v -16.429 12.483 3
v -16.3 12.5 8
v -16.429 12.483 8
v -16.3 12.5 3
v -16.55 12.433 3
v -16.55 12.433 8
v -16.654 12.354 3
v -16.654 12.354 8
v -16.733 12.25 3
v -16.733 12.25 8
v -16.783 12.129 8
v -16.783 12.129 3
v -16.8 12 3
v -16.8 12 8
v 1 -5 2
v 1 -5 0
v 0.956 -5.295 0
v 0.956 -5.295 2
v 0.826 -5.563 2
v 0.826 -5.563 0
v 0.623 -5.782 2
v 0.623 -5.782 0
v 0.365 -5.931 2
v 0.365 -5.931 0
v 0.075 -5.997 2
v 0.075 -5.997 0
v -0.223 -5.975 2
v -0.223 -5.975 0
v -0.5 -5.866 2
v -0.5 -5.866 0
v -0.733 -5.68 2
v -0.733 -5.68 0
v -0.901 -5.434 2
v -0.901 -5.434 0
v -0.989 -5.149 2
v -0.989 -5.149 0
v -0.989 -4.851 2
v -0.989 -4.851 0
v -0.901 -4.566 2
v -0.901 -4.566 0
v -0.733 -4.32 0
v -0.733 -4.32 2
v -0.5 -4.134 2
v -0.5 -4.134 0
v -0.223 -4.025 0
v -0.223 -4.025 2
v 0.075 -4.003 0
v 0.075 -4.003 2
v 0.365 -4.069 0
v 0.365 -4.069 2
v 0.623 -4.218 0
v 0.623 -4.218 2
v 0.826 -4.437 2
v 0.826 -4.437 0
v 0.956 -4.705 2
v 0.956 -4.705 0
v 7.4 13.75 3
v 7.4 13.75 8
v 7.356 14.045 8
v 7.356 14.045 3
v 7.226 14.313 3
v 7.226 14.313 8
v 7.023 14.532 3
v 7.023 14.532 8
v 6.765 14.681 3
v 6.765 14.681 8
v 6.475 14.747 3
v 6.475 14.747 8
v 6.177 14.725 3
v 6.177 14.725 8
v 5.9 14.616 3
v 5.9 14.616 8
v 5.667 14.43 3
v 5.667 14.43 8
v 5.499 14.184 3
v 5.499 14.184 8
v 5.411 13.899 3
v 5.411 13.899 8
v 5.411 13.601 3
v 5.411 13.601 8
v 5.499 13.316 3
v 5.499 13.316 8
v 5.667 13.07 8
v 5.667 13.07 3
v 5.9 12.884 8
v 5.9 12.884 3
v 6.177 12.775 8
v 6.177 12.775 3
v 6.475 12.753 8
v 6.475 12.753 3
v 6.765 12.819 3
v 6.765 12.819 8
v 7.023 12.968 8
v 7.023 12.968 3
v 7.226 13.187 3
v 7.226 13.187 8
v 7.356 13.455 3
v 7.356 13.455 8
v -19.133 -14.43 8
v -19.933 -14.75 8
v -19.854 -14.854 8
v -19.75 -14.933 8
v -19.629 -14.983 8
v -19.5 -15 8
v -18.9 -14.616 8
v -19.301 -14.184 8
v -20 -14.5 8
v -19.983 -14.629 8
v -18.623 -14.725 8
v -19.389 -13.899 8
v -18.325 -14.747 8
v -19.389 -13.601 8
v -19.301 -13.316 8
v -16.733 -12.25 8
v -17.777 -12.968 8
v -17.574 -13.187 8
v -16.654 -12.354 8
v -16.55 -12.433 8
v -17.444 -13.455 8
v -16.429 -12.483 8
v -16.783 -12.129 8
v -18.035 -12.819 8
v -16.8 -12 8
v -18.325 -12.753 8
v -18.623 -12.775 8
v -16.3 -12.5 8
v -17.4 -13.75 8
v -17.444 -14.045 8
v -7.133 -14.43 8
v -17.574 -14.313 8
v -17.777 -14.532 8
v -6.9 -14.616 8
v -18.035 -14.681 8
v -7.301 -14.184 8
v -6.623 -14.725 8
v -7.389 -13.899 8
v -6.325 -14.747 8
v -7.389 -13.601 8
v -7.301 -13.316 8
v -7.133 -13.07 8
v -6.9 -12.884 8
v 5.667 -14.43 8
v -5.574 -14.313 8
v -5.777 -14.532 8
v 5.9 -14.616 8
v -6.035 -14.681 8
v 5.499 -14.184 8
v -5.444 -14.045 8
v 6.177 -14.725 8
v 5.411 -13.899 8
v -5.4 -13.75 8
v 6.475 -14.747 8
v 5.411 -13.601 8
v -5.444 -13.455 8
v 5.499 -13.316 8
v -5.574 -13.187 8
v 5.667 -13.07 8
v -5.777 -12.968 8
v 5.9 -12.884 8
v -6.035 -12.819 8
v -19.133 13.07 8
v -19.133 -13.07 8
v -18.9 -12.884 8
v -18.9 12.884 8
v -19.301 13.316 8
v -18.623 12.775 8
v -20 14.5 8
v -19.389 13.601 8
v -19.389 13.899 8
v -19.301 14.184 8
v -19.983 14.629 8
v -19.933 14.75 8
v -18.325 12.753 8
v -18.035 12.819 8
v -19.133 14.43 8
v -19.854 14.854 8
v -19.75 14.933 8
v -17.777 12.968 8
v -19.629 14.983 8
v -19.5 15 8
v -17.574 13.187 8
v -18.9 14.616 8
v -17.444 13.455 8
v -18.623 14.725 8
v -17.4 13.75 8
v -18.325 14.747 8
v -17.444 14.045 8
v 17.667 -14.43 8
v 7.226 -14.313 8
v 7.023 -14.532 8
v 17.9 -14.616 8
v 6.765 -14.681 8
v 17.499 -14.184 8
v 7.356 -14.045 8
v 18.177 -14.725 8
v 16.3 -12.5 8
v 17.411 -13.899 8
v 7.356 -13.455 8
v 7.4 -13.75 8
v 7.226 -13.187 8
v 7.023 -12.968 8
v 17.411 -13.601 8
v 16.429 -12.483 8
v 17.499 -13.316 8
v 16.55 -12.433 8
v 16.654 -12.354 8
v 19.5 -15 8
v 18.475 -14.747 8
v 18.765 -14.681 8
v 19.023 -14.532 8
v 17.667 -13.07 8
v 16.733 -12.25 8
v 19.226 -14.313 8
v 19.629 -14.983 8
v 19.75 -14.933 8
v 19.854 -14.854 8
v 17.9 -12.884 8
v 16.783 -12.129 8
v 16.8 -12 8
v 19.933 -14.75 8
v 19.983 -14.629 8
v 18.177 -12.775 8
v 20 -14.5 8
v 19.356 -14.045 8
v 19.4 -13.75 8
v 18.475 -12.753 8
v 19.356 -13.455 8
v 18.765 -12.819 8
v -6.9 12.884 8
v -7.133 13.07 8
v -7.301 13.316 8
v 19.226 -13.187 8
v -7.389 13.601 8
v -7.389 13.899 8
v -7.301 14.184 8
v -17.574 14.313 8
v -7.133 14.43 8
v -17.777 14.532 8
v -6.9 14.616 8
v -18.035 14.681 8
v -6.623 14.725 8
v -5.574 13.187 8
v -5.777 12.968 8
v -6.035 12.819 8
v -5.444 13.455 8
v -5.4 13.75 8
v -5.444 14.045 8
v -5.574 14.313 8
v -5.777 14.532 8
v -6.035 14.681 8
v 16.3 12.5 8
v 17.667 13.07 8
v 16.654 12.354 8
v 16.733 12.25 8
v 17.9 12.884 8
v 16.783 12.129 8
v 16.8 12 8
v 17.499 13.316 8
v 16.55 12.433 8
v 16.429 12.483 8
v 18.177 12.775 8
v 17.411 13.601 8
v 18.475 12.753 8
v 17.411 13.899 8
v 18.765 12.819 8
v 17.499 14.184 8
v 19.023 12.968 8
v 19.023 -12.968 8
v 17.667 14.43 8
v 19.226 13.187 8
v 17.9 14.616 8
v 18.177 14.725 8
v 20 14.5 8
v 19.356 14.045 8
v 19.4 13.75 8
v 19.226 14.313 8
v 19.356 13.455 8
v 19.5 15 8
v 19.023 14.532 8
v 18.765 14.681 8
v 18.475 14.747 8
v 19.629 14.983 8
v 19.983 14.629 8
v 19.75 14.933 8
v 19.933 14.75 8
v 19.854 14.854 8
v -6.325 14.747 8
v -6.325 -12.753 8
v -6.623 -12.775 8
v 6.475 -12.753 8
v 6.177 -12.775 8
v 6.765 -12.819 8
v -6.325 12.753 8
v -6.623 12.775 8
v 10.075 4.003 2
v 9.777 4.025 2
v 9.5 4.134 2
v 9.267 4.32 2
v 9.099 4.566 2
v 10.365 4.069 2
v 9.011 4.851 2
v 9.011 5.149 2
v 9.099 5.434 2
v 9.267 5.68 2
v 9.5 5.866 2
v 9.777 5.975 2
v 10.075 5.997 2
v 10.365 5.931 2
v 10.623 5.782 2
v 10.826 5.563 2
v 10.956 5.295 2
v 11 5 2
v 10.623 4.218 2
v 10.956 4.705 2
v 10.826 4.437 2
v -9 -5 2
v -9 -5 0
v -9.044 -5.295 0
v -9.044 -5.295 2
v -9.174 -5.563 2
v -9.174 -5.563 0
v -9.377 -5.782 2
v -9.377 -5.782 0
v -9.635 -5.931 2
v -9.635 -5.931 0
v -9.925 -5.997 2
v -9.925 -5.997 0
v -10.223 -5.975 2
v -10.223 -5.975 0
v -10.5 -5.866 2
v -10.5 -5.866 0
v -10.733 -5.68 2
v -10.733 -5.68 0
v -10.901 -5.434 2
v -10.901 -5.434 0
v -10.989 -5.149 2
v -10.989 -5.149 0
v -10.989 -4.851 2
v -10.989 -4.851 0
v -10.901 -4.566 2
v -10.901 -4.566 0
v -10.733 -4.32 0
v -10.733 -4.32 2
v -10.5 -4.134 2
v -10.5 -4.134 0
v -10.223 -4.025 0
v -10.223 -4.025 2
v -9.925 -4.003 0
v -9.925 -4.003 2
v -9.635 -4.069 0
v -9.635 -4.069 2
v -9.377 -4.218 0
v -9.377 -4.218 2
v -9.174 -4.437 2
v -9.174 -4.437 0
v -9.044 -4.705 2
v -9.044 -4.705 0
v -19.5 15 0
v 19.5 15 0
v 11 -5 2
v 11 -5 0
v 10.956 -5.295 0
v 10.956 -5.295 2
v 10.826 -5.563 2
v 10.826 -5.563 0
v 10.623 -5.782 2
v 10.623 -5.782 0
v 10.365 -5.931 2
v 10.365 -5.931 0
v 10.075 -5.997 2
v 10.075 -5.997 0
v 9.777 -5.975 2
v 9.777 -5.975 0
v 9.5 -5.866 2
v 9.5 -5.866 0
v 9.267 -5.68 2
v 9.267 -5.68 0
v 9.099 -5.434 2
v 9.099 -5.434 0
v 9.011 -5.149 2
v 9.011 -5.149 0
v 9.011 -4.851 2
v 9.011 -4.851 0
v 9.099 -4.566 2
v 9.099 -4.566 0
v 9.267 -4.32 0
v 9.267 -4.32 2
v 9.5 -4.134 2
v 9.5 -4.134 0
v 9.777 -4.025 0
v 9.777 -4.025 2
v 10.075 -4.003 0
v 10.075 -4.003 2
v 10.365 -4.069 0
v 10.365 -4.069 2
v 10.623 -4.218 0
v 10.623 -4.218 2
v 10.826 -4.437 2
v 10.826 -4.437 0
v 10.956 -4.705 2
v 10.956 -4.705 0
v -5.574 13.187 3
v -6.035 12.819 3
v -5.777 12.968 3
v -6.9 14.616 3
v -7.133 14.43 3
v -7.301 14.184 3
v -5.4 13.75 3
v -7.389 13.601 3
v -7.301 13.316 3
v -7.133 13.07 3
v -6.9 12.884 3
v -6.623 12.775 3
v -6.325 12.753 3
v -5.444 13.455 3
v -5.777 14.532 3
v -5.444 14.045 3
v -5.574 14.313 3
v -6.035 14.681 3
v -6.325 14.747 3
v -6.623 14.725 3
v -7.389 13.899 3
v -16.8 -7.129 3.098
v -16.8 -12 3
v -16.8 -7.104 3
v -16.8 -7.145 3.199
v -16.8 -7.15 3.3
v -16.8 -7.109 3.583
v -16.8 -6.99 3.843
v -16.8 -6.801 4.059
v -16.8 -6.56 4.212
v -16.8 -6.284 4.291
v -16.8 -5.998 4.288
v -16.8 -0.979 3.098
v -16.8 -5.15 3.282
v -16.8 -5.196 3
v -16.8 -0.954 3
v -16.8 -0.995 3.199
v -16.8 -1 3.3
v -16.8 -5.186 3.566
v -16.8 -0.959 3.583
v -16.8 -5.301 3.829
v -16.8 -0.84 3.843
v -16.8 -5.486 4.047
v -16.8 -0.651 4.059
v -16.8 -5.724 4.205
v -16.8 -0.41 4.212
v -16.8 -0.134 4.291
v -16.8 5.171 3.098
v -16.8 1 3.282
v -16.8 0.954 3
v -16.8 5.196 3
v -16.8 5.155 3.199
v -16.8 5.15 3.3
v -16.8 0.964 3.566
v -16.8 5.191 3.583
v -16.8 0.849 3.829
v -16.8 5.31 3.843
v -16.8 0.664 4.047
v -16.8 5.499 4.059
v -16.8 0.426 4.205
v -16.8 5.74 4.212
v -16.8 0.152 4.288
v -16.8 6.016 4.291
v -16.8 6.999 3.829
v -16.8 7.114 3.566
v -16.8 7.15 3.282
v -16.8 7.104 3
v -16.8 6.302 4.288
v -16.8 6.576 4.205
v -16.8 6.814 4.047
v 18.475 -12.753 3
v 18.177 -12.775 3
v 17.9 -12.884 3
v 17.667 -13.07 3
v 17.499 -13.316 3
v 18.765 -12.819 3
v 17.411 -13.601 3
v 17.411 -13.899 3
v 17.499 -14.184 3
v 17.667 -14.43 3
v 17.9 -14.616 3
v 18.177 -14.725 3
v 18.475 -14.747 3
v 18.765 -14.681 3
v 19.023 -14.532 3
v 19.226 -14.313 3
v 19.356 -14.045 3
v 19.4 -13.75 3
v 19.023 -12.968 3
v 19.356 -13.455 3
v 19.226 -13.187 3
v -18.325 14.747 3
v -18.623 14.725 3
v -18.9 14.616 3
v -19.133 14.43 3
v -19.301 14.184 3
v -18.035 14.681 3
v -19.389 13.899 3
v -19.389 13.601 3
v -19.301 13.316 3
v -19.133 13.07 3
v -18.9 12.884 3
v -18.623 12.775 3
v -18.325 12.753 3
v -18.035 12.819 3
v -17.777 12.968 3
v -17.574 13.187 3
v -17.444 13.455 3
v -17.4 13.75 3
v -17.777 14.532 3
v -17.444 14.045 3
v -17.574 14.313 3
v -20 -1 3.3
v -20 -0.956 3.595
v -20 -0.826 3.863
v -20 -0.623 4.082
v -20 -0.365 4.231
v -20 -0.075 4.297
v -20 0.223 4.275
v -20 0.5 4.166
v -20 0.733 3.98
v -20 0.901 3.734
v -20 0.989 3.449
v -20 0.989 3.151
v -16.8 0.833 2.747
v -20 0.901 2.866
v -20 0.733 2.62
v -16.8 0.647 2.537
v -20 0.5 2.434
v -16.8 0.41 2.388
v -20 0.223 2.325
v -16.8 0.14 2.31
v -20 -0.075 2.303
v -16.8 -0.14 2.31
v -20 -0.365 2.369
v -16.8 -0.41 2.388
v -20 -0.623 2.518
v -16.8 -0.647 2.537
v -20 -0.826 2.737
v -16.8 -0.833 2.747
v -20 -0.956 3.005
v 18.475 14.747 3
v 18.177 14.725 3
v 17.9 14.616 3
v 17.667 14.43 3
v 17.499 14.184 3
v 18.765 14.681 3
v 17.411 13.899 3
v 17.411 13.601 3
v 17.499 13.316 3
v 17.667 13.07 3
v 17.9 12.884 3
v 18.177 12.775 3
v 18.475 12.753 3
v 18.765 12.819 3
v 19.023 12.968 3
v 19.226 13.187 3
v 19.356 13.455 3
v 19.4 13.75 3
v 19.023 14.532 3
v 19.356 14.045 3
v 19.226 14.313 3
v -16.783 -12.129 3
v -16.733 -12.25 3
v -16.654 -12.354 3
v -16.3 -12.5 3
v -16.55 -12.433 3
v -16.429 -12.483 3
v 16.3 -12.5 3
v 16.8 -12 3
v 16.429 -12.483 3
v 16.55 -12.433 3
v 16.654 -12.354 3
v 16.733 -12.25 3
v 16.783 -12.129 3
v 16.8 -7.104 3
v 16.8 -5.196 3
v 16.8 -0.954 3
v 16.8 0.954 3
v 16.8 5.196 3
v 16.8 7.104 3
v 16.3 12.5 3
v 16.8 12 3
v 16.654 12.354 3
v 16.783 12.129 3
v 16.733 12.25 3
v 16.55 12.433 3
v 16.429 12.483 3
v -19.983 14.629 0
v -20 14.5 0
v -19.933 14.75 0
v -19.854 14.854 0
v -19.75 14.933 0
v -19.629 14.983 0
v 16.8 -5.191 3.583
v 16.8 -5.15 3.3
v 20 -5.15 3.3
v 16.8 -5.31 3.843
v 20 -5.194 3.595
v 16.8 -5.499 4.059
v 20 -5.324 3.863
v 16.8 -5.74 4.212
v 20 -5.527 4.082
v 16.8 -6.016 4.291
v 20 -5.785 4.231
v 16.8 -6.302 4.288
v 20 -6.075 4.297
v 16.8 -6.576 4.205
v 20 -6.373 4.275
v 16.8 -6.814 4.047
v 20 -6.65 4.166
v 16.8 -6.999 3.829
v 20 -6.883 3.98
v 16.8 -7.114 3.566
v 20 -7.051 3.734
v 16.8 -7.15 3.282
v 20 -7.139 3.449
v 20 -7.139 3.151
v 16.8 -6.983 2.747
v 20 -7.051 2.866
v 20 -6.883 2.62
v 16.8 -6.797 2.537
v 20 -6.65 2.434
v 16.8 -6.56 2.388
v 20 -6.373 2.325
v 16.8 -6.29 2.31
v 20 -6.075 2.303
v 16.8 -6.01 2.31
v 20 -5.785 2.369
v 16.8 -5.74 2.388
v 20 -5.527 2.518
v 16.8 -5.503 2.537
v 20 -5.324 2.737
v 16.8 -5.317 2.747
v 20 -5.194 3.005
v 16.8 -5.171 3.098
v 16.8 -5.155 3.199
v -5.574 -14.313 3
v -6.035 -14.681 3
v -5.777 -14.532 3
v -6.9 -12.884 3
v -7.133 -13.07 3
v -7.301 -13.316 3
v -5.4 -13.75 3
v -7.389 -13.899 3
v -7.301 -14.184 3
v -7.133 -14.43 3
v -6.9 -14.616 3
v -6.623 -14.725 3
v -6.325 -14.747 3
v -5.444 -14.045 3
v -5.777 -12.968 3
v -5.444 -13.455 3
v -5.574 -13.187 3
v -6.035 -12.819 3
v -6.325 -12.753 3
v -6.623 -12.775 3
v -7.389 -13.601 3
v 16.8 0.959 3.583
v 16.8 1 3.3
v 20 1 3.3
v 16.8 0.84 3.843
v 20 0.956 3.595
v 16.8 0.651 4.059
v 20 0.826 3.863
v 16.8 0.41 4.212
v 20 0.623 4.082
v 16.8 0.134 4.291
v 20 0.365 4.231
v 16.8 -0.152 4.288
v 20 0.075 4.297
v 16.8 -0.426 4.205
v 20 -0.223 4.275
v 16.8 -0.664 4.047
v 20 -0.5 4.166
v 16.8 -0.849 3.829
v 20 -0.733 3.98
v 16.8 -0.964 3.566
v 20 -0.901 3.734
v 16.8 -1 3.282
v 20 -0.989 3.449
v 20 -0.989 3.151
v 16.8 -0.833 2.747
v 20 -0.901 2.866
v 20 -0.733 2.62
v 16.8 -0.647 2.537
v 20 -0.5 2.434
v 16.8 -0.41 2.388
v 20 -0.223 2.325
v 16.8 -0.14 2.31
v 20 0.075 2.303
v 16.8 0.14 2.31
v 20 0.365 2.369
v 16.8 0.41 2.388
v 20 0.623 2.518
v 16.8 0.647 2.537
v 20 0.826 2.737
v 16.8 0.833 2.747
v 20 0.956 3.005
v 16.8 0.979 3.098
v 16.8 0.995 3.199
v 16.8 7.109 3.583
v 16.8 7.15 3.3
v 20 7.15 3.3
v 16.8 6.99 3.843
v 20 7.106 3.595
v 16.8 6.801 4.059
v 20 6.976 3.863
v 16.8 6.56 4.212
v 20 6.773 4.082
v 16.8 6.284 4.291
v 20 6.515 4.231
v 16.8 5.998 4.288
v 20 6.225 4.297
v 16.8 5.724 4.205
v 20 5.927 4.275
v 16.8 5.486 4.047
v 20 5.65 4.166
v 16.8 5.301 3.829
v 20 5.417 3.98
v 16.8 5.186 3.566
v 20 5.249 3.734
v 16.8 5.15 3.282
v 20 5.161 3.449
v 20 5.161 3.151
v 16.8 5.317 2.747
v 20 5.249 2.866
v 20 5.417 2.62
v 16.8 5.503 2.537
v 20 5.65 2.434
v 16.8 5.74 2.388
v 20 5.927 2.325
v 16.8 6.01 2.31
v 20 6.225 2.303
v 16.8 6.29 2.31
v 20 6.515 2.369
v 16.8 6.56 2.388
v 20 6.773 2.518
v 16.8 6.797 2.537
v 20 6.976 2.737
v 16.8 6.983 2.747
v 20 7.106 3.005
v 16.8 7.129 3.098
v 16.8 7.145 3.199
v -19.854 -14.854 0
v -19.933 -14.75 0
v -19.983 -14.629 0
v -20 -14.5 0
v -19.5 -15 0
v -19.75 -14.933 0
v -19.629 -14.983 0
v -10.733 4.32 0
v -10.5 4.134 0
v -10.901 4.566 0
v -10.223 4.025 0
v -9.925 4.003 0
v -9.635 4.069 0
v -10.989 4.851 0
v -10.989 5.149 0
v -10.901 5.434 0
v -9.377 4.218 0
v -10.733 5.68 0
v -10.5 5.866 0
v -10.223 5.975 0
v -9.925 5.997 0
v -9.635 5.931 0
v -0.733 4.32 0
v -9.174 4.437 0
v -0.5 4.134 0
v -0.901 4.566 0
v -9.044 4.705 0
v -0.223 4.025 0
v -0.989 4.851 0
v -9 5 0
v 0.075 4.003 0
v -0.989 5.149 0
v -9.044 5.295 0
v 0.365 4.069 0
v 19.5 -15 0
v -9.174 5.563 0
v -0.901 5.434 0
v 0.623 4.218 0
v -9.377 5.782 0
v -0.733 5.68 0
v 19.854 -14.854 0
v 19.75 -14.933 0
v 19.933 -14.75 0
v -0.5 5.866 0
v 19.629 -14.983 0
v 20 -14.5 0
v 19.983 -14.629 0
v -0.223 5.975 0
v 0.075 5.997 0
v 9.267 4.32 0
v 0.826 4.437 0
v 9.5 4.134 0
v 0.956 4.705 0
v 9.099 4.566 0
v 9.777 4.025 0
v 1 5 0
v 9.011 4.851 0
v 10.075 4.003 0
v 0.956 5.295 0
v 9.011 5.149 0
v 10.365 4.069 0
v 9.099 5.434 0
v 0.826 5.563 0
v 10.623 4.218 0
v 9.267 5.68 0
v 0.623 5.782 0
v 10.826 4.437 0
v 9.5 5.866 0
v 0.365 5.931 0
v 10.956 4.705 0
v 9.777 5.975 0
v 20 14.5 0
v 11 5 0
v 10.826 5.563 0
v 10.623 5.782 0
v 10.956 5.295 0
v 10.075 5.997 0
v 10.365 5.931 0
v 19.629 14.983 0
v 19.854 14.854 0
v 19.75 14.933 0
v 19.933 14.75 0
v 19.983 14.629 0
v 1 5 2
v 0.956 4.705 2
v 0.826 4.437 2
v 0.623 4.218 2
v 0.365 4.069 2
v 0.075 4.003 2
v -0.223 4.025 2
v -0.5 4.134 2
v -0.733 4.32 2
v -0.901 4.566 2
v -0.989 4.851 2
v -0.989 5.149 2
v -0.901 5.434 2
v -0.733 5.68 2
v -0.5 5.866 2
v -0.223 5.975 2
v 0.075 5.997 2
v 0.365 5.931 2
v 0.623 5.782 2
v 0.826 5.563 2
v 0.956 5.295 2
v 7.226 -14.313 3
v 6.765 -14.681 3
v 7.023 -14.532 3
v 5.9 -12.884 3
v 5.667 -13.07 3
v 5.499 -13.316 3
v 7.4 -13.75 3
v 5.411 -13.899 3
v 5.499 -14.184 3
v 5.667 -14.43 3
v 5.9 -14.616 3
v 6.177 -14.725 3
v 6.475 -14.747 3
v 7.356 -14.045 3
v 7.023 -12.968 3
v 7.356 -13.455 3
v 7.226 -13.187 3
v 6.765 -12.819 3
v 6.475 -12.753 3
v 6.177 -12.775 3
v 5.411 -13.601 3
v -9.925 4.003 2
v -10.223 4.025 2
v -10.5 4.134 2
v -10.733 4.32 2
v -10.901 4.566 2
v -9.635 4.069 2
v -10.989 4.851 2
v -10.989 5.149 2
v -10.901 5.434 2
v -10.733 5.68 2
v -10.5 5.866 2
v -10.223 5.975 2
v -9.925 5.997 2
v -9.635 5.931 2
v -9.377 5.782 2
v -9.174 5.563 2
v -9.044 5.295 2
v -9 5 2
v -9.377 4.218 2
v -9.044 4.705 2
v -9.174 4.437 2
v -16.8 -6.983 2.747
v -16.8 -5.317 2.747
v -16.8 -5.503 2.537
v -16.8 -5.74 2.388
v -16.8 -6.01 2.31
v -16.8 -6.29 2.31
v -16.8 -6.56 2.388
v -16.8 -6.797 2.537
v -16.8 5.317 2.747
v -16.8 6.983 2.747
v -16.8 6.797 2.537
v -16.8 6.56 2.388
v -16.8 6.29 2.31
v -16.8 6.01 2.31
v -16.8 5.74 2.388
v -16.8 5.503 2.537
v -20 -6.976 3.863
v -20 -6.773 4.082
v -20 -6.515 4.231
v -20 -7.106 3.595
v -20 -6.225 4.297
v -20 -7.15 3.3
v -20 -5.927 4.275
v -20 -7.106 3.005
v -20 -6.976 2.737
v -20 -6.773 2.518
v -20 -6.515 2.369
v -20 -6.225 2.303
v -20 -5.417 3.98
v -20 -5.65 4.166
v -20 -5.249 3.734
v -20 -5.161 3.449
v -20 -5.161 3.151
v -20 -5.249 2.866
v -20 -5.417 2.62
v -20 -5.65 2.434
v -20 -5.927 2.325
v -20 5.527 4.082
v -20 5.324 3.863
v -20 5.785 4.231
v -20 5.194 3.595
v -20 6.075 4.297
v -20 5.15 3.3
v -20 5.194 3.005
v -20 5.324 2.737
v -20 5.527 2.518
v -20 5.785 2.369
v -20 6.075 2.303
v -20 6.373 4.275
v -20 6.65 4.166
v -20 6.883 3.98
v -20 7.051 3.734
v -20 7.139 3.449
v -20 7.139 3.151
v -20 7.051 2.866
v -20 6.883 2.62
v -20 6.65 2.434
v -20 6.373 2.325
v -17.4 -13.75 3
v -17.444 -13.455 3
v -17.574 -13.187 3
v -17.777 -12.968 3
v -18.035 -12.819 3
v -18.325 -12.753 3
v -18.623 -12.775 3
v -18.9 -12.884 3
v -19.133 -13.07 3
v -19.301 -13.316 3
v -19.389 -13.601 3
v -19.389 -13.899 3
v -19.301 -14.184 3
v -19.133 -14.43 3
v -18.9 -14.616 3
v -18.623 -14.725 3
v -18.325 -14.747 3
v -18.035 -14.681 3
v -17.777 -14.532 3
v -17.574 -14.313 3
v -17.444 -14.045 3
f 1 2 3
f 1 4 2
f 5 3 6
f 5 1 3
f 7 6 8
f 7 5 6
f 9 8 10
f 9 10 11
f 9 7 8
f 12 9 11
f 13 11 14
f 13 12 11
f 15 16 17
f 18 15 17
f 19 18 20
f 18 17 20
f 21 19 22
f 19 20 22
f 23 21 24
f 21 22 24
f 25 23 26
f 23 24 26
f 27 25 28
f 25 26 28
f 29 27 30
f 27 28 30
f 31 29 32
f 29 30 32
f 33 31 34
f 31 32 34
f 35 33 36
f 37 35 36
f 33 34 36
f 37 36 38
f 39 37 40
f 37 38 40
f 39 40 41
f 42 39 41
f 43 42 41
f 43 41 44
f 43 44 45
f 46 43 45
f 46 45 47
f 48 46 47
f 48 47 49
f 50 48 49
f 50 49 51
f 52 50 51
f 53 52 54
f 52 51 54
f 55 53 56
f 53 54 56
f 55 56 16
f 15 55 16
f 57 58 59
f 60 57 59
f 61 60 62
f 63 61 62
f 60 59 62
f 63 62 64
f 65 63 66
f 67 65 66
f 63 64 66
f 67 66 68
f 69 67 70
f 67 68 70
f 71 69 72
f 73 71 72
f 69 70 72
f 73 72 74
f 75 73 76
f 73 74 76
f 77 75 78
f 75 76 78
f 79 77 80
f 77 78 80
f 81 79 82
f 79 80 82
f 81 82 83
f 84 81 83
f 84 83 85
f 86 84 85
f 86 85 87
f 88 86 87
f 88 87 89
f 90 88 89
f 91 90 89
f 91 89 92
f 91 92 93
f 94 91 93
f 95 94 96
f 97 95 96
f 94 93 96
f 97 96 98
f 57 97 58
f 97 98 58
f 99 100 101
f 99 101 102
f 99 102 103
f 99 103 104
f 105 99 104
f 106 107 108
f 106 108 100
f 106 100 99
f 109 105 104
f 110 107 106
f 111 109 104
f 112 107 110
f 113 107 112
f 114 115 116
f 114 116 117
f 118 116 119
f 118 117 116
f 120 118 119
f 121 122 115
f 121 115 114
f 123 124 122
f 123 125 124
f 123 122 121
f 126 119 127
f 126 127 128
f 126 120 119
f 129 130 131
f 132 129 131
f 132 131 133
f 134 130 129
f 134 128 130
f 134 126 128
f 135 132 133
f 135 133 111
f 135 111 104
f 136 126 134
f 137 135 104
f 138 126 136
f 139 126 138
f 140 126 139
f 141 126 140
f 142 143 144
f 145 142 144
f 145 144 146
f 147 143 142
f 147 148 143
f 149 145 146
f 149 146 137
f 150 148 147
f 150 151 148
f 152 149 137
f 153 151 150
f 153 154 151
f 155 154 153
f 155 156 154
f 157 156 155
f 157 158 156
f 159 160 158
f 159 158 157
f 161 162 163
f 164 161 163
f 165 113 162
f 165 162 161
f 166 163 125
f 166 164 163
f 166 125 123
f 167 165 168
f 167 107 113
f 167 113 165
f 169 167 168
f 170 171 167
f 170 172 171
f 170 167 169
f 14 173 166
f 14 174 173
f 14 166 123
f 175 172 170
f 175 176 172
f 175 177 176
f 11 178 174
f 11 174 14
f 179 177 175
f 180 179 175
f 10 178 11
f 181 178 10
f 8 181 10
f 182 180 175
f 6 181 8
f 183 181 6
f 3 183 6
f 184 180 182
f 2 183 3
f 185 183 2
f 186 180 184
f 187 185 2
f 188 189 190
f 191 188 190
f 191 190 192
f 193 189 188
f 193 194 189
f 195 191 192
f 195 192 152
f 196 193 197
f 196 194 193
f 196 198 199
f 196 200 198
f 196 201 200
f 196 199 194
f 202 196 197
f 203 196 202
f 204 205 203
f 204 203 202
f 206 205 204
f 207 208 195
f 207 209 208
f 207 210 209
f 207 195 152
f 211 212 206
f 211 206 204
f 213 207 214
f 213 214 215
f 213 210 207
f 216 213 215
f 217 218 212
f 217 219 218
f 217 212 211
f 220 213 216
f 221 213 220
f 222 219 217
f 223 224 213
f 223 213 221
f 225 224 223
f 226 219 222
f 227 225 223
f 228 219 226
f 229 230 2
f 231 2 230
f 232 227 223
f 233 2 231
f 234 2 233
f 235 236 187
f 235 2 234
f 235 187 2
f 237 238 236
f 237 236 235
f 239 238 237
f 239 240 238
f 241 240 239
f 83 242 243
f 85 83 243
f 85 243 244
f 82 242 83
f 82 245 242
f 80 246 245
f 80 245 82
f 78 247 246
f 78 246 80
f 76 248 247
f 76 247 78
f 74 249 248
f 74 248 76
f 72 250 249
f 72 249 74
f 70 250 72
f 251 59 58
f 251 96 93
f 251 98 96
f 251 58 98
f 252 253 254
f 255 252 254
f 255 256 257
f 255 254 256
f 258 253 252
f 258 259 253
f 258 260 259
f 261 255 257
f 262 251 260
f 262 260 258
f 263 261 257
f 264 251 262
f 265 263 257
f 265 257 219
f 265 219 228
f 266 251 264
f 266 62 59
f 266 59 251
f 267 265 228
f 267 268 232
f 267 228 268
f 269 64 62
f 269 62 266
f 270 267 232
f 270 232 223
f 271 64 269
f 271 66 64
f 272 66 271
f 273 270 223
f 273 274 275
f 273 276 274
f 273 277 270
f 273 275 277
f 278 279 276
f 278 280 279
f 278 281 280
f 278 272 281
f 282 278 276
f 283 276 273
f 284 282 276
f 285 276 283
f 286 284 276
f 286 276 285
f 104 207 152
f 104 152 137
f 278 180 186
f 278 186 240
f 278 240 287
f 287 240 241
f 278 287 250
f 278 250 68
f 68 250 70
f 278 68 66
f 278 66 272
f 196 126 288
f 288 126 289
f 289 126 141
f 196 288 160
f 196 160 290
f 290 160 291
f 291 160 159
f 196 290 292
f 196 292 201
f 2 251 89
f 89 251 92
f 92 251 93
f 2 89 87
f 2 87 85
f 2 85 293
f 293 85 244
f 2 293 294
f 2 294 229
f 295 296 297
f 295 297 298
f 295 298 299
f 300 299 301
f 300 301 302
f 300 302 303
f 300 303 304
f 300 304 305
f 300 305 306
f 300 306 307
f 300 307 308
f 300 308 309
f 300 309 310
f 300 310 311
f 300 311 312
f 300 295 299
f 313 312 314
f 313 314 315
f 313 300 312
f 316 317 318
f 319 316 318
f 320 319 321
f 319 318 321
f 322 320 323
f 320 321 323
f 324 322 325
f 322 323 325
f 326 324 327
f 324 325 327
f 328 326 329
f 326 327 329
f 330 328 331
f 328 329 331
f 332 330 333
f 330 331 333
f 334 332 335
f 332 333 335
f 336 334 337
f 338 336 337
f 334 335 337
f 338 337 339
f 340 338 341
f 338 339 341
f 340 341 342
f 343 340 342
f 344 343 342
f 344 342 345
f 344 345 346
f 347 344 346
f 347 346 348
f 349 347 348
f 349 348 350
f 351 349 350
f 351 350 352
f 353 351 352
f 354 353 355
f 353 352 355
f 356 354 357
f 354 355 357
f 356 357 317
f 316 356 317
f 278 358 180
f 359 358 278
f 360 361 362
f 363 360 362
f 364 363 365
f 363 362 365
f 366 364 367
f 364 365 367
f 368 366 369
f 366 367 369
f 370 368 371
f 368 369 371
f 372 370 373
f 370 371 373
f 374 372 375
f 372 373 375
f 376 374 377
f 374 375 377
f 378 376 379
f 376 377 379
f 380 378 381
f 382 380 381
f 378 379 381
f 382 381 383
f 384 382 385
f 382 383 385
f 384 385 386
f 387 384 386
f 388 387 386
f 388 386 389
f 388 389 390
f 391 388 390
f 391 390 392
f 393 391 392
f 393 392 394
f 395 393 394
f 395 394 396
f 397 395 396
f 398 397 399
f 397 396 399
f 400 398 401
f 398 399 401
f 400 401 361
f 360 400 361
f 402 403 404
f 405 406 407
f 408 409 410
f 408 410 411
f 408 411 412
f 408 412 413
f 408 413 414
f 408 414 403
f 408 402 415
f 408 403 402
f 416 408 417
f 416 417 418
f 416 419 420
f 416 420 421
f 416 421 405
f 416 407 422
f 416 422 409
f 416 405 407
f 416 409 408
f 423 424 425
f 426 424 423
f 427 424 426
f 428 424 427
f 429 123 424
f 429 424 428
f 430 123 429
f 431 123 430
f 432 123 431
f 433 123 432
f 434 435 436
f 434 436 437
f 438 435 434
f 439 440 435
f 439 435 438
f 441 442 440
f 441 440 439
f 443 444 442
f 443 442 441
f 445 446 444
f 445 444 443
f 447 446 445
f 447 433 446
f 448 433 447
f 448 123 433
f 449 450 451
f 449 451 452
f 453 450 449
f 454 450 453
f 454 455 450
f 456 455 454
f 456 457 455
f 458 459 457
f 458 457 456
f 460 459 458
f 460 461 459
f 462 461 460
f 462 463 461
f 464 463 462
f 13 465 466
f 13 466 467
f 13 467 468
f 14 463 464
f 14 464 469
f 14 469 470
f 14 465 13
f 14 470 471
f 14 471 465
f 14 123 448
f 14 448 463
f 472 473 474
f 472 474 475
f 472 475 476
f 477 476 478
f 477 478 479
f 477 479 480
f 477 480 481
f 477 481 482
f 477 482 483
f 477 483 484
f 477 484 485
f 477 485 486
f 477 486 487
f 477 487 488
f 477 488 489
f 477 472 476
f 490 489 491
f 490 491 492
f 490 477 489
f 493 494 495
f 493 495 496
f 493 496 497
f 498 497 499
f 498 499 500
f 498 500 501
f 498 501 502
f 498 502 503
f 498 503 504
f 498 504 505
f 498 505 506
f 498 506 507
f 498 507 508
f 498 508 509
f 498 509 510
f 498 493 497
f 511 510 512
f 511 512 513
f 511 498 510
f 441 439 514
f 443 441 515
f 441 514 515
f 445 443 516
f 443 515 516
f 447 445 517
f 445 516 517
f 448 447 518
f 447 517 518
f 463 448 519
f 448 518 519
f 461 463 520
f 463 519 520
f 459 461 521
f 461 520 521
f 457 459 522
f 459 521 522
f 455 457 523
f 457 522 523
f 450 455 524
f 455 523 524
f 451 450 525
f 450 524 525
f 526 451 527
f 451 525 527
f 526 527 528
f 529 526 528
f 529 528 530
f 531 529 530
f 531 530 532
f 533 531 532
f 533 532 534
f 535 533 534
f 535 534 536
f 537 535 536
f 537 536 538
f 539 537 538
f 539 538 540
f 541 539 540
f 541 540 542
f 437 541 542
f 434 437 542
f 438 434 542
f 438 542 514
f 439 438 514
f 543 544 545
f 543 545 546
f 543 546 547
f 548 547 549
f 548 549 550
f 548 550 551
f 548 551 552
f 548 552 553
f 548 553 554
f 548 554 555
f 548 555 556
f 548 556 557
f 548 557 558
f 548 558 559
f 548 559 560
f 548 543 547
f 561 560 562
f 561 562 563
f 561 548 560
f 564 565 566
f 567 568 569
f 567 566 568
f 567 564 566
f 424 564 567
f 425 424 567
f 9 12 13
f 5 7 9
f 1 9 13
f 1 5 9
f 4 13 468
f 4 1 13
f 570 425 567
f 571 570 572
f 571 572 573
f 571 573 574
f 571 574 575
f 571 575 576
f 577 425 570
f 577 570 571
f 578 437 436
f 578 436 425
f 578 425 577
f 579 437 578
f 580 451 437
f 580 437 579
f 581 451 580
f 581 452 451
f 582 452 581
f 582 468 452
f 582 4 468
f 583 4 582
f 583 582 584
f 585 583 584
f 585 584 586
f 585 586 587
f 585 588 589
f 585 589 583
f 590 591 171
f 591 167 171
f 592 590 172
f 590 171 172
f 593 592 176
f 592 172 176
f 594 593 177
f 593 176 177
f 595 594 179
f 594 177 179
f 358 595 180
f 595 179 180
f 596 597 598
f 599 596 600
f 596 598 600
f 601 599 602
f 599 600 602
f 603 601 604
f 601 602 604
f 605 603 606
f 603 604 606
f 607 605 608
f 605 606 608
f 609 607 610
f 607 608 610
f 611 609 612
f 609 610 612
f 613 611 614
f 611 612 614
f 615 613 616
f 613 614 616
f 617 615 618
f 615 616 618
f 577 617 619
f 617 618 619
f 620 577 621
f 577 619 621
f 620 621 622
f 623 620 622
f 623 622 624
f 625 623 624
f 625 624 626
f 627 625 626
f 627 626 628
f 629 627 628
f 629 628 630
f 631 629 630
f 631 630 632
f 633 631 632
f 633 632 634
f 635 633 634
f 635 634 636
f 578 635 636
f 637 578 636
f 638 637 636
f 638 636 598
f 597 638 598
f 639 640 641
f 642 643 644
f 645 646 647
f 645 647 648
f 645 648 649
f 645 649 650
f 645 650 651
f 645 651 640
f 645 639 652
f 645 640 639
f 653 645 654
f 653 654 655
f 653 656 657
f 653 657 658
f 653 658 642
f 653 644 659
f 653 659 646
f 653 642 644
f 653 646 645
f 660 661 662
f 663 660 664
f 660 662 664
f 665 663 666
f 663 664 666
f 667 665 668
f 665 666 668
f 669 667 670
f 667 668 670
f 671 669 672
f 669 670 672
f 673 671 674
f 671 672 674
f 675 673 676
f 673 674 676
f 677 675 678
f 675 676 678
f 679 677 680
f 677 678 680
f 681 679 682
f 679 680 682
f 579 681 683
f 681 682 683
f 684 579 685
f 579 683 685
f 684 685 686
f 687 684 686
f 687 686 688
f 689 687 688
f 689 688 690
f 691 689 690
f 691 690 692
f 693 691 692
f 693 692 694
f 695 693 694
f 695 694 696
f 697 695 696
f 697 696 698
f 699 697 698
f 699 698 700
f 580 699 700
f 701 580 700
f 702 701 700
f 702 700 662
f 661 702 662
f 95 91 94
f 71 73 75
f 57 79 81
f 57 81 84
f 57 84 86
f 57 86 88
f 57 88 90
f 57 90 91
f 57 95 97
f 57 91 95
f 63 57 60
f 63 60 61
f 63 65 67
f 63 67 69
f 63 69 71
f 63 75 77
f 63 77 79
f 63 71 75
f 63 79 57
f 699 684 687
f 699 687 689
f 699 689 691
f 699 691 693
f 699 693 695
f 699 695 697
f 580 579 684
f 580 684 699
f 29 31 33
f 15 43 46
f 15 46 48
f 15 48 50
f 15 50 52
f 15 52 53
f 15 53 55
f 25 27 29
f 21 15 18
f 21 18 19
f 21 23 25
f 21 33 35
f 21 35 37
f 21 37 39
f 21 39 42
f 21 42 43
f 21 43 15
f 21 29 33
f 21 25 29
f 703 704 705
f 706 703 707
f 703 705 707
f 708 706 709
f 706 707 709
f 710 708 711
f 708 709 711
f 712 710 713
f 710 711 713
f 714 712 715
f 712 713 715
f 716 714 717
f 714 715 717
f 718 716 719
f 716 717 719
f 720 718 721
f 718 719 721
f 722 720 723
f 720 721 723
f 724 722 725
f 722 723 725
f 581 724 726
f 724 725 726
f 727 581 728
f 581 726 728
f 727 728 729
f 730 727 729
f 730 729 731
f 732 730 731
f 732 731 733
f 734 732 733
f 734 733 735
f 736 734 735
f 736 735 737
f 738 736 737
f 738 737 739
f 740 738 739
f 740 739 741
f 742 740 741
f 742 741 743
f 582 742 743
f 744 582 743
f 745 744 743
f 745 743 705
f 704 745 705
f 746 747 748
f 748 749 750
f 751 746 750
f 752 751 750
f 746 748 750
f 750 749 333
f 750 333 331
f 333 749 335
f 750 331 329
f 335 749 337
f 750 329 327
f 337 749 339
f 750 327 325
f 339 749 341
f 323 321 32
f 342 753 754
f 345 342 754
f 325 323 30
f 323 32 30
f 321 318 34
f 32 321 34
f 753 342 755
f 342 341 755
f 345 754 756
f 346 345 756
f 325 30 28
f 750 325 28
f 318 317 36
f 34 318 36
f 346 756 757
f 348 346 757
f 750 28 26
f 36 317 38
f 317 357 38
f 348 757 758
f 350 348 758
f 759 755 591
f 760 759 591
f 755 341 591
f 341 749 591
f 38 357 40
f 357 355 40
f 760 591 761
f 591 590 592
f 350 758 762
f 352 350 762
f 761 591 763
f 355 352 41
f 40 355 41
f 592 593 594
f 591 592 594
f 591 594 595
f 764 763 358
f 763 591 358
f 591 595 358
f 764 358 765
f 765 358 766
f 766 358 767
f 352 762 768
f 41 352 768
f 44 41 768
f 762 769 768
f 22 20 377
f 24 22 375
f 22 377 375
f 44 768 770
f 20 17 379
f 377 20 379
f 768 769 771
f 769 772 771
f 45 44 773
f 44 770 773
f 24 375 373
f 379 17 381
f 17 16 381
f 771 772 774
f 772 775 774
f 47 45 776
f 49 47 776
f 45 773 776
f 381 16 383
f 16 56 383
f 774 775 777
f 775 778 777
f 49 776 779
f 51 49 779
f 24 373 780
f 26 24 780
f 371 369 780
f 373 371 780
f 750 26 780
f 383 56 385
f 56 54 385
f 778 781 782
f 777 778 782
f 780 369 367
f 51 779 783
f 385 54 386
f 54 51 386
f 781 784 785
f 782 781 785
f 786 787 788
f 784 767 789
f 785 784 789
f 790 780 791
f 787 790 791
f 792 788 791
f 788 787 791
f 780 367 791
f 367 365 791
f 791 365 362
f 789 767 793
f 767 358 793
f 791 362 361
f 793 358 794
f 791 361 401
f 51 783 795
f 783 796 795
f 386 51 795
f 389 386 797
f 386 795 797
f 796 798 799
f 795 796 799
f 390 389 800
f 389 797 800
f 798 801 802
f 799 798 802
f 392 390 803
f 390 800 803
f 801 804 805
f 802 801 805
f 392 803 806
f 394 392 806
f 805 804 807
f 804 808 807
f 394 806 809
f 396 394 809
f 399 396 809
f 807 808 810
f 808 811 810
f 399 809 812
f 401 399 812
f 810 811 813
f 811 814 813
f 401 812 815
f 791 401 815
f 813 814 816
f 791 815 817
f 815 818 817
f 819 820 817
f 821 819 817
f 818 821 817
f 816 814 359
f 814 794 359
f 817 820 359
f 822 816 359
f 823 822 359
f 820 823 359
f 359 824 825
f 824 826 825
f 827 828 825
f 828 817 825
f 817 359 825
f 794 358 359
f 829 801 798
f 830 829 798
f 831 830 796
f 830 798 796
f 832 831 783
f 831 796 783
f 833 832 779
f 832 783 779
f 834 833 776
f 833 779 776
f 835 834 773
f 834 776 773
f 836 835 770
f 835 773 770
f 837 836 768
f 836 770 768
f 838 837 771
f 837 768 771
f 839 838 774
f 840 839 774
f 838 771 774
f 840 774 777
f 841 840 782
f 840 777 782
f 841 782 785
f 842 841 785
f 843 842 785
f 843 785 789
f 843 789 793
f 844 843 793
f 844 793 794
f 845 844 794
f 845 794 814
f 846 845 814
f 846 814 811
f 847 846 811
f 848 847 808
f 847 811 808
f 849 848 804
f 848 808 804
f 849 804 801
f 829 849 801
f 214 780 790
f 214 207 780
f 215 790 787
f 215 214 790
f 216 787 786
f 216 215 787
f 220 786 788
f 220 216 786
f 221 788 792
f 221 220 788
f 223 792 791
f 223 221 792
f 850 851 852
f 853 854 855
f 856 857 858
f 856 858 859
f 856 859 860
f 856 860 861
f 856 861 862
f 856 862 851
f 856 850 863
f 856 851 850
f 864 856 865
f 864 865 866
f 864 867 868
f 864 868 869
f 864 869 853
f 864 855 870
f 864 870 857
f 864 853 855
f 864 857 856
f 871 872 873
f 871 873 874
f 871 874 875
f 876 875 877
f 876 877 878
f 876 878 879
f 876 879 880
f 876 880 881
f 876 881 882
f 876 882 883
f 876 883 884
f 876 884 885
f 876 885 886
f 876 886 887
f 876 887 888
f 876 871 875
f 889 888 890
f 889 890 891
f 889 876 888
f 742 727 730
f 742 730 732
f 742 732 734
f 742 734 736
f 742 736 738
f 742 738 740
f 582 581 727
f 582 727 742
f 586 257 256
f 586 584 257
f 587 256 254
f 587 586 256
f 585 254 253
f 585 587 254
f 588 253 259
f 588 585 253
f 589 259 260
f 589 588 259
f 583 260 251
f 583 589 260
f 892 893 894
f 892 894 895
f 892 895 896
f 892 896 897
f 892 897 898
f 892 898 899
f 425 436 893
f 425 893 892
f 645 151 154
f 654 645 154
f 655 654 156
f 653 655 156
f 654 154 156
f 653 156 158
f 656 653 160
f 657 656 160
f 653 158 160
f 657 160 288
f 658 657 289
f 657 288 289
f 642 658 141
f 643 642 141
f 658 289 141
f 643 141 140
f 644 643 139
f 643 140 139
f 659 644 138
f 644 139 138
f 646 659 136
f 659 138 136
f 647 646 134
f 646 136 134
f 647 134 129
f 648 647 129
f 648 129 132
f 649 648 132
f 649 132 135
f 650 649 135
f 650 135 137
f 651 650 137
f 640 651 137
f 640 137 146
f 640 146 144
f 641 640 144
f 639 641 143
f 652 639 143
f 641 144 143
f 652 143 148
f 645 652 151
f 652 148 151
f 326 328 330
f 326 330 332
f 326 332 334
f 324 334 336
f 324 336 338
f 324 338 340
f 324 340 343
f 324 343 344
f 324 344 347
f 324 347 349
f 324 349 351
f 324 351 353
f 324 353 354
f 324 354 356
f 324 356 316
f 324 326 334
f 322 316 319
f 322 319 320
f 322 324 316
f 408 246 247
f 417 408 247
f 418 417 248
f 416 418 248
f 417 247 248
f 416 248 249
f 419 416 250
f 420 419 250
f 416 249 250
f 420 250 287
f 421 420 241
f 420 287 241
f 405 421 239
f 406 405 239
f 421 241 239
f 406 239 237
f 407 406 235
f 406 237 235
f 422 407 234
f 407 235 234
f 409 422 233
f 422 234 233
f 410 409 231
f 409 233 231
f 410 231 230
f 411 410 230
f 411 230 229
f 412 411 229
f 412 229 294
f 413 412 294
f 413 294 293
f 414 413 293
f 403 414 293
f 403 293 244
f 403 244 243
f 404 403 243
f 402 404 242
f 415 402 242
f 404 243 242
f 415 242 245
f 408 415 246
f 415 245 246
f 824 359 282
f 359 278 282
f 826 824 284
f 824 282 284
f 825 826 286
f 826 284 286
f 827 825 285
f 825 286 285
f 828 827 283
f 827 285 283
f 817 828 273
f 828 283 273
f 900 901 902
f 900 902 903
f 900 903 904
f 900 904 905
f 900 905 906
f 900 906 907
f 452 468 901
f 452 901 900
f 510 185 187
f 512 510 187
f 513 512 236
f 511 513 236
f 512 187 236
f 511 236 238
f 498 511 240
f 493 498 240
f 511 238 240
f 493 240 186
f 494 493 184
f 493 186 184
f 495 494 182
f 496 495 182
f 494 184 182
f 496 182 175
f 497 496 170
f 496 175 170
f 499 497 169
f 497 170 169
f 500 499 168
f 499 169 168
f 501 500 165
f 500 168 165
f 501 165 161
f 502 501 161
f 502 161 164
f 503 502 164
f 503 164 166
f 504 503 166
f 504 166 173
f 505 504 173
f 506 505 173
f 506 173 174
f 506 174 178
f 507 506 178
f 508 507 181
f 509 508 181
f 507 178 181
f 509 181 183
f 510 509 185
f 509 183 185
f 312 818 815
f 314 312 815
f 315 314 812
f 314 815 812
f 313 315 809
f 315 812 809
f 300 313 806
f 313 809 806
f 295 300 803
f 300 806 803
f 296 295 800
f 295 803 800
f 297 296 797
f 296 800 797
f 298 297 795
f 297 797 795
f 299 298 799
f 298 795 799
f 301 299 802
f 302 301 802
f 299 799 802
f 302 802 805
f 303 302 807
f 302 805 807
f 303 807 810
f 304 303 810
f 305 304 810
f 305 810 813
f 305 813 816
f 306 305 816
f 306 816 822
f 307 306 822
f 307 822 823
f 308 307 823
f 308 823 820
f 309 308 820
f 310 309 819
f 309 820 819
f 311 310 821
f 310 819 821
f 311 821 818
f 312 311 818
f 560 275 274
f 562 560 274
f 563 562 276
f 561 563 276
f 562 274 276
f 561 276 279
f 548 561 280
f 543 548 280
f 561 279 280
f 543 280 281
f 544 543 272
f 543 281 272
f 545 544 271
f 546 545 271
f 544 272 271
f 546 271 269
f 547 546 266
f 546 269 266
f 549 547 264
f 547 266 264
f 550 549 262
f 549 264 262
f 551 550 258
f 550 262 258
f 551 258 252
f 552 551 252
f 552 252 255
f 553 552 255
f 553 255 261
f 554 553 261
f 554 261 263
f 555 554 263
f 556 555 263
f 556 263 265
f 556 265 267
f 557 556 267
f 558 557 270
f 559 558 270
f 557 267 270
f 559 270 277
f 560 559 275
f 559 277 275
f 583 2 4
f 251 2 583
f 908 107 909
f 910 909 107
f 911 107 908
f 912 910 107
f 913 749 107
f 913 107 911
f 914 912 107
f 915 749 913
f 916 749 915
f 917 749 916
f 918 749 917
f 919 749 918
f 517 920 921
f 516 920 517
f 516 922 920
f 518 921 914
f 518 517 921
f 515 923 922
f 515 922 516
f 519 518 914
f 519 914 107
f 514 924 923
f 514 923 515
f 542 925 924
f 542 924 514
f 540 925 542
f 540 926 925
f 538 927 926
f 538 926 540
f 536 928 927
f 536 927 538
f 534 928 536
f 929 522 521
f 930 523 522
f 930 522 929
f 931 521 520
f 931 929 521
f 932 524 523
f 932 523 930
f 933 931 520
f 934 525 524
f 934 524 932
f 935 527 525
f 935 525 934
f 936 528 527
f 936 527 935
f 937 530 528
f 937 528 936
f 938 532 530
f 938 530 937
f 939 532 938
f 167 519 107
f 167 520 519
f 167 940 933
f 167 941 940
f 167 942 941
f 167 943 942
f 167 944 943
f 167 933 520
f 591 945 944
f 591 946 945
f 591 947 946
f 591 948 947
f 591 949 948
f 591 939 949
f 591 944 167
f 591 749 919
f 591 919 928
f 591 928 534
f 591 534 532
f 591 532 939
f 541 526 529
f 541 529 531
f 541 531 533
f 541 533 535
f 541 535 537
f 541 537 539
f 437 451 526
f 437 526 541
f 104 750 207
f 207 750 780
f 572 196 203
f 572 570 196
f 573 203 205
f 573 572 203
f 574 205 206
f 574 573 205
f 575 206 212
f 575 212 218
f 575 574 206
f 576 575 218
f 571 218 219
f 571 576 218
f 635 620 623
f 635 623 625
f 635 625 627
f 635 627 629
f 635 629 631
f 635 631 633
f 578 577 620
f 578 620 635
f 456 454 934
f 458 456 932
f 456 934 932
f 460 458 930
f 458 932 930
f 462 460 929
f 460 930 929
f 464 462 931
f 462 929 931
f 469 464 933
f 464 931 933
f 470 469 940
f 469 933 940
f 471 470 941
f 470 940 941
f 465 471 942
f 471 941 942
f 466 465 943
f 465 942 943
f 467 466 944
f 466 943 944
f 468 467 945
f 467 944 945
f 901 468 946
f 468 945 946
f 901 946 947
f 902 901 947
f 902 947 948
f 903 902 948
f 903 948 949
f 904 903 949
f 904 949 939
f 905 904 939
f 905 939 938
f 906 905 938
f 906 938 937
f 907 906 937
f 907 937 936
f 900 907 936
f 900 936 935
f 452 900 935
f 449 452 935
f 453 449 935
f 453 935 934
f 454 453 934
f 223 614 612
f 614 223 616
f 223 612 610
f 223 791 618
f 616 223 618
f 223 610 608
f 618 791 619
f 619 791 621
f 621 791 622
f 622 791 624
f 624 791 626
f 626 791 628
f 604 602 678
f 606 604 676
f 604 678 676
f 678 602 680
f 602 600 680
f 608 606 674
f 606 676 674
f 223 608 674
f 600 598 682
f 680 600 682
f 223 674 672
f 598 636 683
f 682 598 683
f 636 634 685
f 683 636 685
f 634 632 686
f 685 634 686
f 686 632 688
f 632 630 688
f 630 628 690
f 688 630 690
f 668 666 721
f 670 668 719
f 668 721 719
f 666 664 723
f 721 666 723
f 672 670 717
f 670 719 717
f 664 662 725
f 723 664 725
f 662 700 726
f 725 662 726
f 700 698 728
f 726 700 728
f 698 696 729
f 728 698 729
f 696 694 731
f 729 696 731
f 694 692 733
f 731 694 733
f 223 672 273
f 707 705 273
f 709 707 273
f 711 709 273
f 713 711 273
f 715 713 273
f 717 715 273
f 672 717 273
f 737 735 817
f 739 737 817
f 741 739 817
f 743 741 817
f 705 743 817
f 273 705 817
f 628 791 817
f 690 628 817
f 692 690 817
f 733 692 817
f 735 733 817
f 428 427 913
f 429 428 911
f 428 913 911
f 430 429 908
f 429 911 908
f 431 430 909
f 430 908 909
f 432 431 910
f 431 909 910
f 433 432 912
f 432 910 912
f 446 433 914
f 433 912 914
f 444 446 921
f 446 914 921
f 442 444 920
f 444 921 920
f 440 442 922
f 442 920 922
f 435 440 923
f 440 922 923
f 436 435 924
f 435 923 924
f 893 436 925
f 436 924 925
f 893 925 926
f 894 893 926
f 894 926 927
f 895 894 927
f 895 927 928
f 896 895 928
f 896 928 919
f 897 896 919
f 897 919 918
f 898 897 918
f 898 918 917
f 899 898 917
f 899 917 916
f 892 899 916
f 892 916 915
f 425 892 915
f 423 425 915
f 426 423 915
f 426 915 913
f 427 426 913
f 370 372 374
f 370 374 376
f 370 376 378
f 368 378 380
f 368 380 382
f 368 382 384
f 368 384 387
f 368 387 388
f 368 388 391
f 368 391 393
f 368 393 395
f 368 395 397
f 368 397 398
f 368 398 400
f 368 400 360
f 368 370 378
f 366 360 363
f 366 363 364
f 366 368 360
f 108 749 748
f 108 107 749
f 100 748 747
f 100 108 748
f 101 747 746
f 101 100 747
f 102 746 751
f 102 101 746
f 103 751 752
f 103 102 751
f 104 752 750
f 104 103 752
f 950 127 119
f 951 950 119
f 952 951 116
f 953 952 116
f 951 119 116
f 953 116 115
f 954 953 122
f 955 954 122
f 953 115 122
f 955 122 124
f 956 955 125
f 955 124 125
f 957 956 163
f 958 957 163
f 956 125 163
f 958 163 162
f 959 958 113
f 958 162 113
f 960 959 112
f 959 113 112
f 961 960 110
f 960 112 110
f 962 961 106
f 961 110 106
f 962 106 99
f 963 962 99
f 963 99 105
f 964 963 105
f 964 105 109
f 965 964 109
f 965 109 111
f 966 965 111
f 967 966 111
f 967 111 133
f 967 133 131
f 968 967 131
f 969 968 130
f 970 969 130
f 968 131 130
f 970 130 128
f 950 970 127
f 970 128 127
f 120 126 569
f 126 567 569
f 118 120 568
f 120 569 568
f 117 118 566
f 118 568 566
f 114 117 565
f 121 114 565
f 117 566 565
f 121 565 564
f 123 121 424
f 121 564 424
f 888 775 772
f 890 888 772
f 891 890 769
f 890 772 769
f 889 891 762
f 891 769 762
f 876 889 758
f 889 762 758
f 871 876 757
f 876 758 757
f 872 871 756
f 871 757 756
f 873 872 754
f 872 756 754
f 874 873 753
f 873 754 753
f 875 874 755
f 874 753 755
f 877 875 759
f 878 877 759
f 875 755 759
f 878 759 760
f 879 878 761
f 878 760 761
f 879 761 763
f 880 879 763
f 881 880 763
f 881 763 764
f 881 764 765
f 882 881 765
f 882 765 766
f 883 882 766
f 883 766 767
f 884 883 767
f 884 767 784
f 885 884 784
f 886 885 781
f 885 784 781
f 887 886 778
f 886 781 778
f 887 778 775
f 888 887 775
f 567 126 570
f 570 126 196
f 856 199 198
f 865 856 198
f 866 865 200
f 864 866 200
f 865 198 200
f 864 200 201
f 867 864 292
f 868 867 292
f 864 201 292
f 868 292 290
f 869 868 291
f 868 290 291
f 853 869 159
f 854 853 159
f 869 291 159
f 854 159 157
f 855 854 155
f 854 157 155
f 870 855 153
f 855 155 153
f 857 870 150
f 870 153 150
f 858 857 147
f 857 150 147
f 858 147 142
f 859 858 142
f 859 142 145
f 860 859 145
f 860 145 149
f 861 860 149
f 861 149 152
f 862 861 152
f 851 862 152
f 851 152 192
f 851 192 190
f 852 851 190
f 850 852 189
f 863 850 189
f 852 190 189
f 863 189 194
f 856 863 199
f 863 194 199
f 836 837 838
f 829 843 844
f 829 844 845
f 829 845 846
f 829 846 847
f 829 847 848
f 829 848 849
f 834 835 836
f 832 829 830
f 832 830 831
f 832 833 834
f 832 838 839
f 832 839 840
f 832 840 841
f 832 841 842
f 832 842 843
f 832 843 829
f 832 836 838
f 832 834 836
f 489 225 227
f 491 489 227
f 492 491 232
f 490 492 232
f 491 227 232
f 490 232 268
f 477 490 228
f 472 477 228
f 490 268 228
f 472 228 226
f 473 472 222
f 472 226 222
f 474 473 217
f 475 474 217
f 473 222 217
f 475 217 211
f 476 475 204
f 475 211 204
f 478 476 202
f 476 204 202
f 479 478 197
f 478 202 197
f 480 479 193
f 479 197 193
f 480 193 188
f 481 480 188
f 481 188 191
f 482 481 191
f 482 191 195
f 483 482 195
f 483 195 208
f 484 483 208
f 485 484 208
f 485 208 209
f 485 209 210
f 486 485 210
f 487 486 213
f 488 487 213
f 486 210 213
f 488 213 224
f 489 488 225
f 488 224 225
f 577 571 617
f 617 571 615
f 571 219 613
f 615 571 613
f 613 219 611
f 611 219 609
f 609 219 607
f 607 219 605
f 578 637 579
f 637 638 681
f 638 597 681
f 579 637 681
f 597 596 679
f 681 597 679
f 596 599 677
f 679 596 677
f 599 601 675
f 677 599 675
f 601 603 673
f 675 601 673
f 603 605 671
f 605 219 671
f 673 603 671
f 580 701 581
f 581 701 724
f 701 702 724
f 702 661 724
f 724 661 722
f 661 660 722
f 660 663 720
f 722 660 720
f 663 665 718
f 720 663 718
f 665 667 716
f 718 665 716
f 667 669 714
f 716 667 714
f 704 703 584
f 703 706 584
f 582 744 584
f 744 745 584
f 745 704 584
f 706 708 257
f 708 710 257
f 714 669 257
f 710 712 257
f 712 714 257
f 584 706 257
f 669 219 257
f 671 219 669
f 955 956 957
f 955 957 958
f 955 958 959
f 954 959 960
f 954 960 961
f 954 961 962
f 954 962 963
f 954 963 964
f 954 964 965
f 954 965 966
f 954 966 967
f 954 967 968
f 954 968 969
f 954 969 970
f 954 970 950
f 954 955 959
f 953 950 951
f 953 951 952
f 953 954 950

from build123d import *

# Parameters (mm, degrees)
SKETCH_W        = 40
SKETCH_H        = 30
PAD_DEPTH       = 8
SKETCH001_R     = 1
SKETCH001_W     = 33.6
SKETCH001_H     = 25
POCKET_DEPTH    = 5
SKETCH002_R     = 1
POCKET001_DEPTH = 3.2
POCKET002_DEPTH = 3.2
SKETCH003_R     = 1
POCKET003_DEPTH = 2
SKETCH004_R     = 1
POCKET004_DEPTH = 2
FILLET_R        = 0.5
SKETCH005_R     = 1
POCKET005_DEPTH = 3.2


with BuildPart() as part:
    # Sketch (on Sketch) → Pad (new body)
    with BuildSketch(Plane.XY):
        Rectangle(SKETCH_W, SKETCH_H)
    extrude(amount=PAD_DEPTH)

    # Sketch001 (on Face6 of Pad) → Pocket (cut)
    with BuildSketch(Plane.XY.offset(8)):
        with Locations((-18.4, 13.75)):
            Circle(SKETCH001_R)
        with Locations((-6.4, 13.75)):
            Circle(SKETCH001_R)
        with Locations((6.4, 13.75)):
            Circle(SKETCH001_R)
        with Locations((18.4, 13.75)):
            Circle(SKETCH001_R)
        with Locations((-18.4, -13.75)):
            Circle(SKETCH001_R)
        with Locations((-6.4, -13.75)):
            Circle(SKETCH001_R)
        with Locations((6.4, -13.75)):
            Circle(SKETCH001_R)
        with Locations((18.4, -13.75)):
            Circle(SKETCH001_R)
        Rectangle(SKETCH001_W, SKETCH001_H)
    extrude(amount=-POCKET_DEPTH, mode=Mode.SUBTRACT)

    # Sketch002 (on Face2 of Pocket) → Pocket001 (cut)
    with BuildSketch(Plane(origin=(-20, 0, 0), x_dir=(0, -1, 0), z_dir=(-1, 0, 0))):
        with Locations((-6.15, 3.3)):
            Circle(SKETCH002_R)
        with Locations((6.15, 3.3)):
            Circle(SKETCH002_R)
        with Locations((0, 3.3)):
            Circle(SKETCH002_R)
    extrude(amount=-POCKET001_DEPTH, mode=Mode.SUBTRACT)

    # Sketch002 (on Face2 of Pocket) → Pocket002 (cut)
    with BuildSketch(Plane(origin=(-20, 0, 0), x_dir=(0, -1, 0), z_dir=(-1, 0, 0))):
        with Locations((-6.15, 3.3)):
            Circle(SKETCH002_R)
        with Locations((6.15, 3.3)):
            Circle(SKETCH002_R)
        with Locations((0, 3.3)):
            Circle(SKETCH002_R)
    extrude(amount=-POCKET002_DEPTH, mode=Mode.SUBTRACT)

    # Sketch003 → Pocket003 (cut)
    with BuildSketch(Plane.XY.offset(5)):
        with Locations((-12, 10)):
            Circle(SKETCH003_R)
        with Locations((12, 10)):
            Circle(SKETCH003_R)
        with Locations((12, -10)):
            Circle(SKETCH003_R)
        with Locations((-12, -10)):
            Circle(SKETCH003_R)
    extrude(amount=-POCKET003_DEPTH, mode=Mode.SUBTRACT)

    # Sketch004 (on Face4 of Pocket003) → Pocket004 (cut)
    with BuildSketch(Plane(origin=(0, 0, 0), x_dir=(1, 0, 0), z_dir=(0, 0, -1))):
        with Locations((-10, 5)):
            Circle(SKETCH004_R)
        with Locations((0, 5)):
            Circle(SKETCH004_R)
        with Locations((10, 5)):
            Circle(SKETCH004_R)
        with Locations((10, -5)):
            Circle(SKETCH004_R)
        with Locations((0, -5)):
            Circle(SKETCH004_R)
        with Locations((-10, -5)):
            Circle(SKETCH004_R)
    extrude(amount=-POCKET004_DEPTH, mode=Mode.SUBTRACT)

    # Fillet
    fillet_edges = [part.edges().sort_by_distance(p)[0] for p in [
        (20, -15, 4),
        (-16.8, 12.5, 5.5),
        (-20, -15, 4),
        (-20, 15, 4),
        (-16.8, -12.5, 5.5),
        (16.8, 12.5, 5.5),
        (16.8, -12.5, 5.5),
        (20, 15, 4),
    ]]
    fillet(fillet_edges, radius=FILLET_R)

    # Sketch005 (on Face7 of Fillet) → Pocket005 (cut)
    with BuildSketch(Plane.YZ.offset(20)):
        with Locations((-6.15, 3.3)):
            Circle(SKETCH005_R)
        with Locations((6.15, 3.3)):
            Circle(SKETCH005_R)
        with Locations((0, 3.3)):
            Circle(SKETCH005_R)
    extrude(amount=-POCKET005_DEPTH, mode=Mode.SUBTRACT)


solid = part.part
